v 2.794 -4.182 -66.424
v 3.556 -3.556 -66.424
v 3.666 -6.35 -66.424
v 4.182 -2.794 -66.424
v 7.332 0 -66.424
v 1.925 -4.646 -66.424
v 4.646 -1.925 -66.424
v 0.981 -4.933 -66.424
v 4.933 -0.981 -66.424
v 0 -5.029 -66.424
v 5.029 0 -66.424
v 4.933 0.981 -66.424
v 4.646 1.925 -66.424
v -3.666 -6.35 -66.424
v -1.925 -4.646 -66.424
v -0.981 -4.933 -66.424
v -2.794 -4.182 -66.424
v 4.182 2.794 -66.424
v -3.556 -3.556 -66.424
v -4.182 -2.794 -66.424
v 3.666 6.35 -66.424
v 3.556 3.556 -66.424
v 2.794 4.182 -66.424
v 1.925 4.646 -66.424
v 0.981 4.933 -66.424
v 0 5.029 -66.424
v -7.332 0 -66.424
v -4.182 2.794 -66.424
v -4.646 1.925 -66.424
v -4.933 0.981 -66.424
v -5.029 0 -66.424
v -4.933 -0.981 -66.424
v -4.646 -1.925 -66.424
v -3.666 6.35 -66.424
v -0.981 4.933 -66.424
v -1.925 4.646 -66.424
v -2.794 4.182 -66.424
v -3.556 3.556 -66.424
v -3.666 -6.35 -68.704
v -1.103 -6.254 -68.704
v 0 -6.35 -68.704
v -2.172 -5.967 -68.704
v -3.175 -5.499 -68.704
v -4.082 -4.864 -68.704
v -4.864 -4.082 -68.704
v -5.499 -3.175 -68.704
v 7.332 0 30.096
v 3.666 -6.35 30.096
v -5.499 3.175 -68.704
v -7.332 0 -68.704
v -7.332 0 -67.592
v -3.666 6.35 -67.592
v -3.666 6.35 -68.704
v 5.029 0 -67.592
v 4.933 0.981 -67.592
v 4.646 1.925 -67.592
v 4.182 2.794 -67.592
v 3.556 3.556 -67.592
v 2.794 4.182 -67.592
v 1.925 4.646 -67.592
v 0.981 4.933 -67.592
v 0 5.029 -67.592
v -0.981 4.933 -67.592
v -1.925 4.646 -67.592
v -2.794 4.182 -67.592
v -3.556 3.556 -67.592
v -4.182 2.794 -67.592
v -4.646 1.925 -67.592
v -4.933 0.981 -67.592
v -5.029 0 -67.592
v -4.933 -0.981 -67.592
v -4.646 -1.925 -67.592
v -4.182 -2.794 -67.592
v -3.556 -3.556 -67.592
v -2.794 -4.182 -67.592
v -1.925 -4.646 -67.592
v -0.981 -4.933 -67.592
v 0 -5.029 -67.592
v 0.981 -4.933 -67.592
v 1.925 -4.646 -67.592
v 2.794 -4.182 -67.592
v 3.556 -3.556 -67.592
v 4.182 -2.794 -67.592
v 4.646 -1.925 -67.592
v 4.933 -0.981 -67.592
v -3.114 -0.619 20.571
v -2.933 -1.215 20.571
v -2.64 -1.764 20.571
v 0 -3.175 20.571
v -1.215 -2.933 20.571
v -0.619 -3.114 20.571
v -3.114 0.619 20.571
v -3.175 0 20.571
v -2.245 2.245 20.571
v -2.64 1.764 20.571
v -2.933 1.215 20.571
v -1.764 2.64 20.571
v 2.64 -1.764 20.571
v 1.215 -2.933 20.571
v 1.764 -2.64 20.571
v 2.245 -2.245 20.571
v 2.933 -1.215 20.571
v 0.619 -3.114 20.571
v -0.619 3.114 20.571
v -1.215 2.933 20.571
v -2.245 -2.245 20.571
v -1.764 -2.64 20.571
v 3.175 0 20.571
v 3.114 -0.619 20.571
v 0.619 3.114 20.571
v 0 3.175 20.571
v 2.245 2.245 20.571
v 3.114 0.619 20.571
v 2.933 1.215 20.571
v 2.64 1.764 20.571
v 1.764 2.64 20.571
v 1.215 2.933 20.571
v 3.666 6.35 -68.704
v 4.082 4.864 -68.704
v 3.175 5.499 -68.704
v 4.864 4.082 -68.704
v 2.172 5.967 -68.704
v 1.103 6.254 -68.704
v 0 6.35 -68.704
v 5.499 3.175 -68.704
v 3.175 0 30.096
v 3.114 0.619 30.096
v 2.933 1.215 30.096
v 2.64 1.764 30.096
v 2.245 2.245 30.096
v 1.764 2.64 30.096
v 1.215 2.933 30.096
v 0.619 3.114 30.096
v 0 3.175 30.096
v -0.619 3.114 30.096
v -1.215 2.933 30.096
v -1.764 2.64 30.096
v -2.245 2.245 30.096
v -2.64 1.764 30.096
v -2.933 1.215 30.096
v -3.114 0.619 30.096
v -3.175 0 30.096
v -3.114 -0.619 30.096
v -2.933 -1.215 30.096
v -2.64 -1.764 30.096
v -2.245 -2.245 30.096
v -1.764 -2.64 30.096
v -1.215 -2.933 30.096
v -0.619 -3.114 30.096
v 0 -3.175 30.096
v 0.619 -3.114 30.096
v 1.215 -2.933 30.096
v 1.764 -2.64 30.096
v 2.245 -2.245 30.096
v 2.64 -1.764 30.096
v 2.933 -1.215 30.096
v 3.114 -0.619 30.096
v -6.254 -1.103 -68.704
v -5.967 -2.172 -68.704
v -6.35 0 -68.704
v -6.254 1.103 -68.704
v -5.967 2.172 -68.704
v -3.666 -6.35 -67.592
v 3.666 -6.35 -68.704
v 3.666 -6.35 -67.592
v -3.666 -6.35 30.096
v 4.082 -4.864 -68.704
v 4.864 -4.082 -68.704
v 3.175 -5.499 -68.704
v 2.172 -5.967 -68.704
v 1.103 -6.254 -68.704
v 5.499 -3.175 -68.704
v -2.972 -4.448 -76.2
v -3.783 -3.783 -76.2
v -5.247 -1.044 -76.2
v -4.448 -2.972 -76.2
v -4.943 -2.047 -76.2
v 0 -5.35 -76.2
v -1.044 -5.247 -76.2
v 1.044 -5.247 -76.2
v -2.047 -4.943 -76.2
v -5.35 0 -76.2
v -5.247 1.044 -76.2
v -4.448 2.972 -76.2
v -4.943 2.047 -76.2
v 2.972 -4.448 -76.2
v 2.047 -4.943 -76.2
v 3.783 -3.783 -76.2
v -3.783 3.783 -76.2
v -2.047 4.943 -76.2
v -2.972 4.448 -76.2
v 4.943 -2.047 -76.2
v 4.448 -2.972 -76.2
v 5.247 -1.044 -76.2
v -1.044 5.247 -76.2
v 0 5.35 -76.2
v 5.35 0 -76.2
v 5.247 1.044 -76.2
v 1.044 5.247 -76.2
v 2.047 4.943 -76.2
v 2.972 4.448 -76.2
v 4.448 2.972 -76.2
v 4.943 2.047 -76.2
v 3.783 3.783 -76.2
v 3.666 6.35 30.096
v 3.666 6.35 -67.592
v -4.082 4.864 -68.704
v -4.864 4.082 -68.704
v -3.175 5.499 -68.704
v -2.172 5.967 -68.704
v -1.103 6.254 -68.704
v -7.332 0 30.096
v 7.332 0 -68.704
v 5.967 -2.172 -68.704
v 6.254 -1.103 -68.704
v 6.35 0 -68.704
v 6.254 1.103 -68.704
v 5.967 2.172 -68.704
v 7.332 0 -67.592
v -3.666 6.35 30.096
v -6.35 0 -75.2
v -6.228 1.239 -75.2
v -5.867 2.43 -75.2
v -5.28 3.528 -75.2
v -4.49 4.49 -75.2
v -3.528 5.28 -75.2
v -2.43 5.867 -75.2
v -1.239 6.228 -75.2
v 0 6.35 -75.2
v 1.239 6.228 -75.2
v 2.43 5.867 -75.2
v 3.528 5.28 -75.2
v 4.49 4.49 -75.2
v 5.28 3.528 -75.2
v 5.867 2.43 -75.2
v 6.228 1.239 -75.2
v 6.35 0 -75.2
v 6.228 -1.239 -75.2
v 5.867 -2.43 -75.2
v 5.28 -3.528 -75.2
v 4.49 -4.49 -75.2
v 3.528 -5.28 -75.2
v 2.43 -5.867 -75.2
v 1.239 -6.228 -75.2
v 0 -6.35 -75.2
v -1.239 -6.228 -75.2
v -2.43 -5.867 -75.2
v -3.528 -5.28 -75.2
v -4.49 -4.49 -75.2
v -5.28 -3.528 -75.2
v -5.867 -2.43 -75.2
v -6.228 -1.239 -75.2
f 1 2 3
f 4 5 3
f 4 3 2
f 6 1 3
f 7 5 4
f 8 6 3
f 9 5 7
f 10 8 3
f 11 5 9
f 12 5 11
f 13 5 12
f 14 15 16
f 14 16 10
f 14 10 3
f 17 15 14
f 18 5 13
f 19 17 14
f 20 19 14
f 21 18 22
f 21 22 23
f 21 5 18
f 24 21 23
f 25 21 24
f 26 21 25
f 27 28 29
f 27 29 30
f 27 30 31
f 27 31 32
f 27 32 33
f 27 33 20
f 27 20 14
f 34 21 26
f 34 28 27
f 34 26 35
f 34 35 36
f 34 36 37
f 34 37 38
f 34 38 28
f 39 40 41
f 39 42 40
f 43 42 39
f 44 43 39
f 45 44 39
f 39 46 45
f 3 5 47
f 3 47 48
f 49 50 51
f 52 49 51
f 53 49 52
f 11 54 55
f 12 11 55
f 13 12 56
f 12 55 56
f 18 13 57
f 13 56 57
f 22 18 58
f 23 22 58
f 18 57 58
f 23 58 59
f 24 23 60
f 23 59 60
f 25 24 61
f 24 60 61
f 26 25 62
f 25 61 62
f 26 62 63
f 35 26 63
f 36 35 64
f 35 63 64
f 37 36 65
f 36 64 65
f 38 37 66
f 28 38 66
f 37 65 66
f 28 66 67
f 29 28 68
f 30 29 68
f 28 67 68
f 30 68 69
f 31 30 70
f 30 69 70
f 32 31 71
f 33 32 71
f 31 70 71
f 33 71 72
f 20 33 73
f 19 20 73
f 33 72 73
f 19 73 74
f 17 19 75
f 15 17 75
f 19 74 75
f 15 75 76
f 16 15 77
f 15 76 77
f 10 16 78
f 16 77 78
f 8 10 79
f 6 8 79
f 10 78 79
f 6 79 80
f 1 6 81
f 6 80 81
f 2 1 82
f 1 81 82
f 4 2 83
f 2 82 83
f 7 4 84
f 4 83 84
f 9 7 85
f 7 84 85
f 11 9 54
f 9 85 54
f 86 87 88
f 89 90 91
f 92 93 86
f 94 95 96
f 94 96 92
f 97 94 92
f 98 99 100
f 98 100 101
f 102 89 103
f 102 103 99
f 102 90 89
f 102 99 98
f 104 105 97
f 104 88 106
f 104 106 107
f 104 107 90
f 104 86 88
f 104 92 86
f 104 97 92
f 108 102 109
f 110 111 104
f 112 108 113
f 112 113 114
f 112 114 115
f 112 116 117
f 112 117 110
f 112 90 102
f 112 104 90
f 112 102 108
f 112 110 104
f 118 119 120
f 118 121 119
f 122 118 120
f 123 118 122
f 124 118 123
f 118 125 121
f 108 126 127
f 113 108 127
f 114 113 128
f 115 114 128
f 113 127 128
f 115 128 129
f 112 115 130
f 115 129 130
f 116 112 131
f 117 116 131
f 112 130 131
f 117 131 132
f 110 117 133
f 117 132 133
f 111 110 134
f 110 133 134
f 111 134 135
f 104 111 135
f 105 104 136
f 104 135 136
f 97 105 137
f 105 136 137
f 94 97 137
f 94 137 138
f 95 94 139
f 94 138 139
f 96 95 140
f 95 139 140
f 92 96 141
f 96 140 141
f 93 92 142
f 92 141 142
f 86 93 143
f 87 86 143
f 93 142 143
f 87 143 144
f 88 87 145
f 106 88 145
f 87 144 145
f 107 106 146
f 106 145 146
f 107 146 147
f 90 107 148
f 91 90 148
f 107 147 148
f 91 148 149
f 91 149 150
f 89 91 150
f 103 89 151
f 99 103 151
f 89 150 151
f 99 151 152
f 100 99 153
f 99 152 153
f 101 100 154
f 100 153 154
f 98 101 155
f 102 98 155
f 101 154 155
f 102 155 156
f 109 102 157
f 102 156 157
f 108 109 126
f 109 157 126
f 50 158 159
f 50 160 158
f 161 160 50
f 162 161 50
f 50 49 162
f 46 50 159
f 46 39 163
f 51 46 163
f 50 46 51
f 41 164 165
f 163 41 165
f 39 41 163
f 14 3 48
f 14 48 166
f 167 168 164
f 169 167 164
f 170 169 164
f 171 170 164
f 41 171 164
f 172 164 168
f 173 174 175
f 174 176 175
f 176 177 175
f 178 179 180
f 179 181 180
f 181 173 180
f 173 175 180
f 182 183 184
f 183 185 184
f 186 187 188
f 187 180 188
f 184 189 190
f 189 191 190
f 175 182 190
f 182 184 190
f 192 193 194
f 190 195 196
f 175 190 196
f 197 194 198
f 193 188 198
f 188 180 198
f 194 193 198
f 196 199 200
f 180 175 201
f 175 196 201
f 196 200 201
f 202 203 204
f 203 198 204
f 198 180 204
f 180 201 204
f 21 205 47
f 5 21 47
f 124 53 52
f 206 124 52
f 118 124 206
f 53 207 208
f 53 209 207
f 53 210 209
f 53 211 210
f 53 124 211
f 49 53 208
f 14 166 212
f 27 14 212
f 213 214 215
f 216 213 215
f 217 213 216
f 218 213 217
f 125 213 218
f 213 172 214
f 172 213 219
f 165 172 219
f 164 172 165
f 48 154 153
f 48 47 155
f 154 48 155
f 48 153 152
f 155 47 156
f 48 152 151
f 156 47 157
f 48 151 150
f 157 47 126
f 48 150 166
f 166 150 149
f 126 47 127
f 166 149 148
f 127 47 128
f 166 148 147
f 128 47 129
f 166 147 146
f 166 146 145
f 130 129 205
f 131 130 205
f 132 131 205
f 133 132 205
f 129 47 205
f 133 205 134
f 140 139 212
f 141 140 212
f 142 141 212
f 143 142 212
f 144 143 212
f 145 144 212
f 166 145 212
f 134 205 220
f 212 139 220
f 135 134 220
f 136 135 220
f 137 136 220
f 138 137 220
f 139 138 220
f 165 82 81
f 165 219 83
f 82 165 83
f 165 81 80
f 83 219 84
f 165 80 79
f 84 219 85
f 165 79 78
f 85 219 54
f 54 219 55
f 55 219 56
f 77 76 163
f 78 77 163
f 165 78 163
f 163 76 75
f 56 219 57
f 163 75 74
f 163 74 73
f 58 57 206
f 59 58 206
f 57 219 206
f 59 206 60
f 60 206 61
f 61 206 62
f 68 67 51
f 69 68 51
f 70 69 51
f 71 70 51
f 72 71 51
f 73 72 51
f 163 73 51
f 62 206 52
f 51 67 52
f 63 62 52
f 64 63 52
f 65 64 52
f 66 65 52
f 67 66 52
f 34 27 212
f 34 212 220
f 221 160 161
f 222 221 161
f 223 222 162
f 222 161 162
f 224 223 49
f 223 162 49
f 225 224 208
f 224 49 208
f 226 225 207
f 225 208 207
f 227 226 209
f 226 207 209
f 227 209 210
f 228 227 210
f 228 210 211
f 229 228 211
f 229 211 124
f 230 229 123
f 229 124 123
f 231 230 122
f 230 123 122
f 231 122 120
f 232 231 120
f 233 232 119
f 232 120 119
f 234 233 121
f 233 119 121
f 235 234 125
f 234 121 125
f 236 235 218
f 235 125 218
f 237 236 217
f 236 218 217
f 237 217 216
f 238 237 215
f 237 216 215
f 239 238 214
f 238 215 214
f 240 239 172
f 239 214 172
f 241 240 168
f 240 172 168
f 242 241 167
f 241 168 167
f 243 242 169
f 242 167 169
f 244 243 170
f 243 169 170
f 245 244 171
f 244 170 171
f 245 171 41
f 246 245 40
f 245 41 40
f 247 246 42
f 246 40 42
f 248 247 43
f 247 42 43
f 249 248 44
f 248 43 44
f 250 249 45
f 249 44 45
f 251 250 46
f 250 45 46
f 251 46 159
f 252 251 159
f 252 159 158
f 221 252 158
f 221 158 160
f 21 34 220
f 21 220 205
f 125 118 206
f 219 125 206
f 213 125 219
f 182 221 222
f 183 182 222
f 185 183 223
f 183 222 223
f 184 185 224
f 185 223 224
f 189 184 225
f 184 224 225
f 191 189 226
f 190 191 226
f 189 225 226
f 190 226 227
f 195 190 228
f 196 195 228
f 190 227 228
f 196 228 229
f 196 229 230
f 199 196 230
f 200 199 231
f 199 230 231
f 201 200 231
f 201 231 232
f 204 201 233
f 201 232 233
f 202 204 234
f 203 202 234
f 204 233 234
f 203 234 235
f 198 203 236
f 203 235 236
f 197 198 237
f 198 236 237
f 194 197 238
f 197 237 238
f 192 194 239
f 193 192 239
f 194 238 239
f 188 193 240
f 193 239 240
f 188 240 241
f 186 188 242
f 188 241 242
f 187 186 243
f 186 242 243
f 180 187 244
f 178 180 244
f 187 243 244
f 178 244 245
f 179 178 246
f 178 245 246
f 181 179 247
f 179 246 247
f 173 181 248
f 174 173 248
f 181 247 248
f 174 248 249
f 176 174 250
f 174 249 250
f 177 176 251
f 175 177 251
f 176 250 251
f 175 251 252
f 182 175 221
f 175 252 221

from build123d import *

# Parameters (mm, degrees)
BOSS_EXTRUDE1_DEPTH = 1.1116
SKETCH2_R           = 5.0292
BOSS_EXTRUDE2_DEPTH = 1.1684
BOSS_EXTRUDE3_DEPTH = 96.52
SKETCH4_W           = 6.35
SKETCH4_H           = 7.496
CHAMFER1_SIZE       = 1
SKETCH5_R           = 3.175
CUT_EXTRUDE1_DEPTH  = 9.525


with BuildPart() as part:
    # Sketch1 → Boss-Extrude1 (new body)
    with BuildSketch(Plane(origin=(0, 0, -68.704), x_dir=(-1, 0, 0), z_dir=(0, 0, -1))):
        Polygon((-3.666174209, 6.35), (-7.332348419, 0), (-3.666174209, -6.35), (3.666174209, -6.35), (7.332348419, 0), (3.666174209, 6.35), align=None)
    extrude(amount=-BOSS_EXTRUDE1_DEPTH)

    # Sketch2 → Boss-Extrude2 (add)
    with BuildSketch(Plane.XY.offset(-67.5924)):
        Circle(SKETCH2_R)
    extrude(amount=BOSS_EXTRUDE2_DEPTH)

    # Sketch3 → Boss-Extrude3 (add)
    with BuildSketch(Plane(origin=(0, 0, -66.424), x_dir=(-1, 0, 0), z_dir=(0, 0, -1))):
        Polygon((3.666174209, -6.35), (7.332348419, 0), (3.666174209, 6.35), (-3.666174209, 6.35), (-7.332348419, 0), (-3.666174209, -6.35), align=None)
    extrude(amount=-BOSS_EXTRUDE3_DEPTH)

    # Sketch4 → Revolve1 (revolve)
    with BuildSketch(Plane.XZ, mode=Mode.PRIVATE) as revolve1_sk:
        with Locations((3.175, -72.452)):
            Rectangle(SKETCH4_W, SKETCH4_H)
    revolve(revolve1_sk.sketch.rotate(Axis((0, 0, -68.704), (0, 0, -1)), 180), axis=Axis((0, 0, -68.704), (0, 0, -1)))

    # Chamfer1
    chamfer1_edges = [part.edges().sort_by_distance(p)[0] for p in [
        (6.35, 0, -76.2),
    ]]
    chamfer(chamfer1_edges, length=CHAMFER1_SIZE)

    # Sketch5 → Cut-Extrude1 (cut)
    with BuildSketch(Plane.XY.offset(30.096)):
        Circle(SKETCH5_R)
    extrude(amount=-CUT_EXTRUDE1_DEPTH, mode=Mode.SUBTRACT)


solid = part.part
